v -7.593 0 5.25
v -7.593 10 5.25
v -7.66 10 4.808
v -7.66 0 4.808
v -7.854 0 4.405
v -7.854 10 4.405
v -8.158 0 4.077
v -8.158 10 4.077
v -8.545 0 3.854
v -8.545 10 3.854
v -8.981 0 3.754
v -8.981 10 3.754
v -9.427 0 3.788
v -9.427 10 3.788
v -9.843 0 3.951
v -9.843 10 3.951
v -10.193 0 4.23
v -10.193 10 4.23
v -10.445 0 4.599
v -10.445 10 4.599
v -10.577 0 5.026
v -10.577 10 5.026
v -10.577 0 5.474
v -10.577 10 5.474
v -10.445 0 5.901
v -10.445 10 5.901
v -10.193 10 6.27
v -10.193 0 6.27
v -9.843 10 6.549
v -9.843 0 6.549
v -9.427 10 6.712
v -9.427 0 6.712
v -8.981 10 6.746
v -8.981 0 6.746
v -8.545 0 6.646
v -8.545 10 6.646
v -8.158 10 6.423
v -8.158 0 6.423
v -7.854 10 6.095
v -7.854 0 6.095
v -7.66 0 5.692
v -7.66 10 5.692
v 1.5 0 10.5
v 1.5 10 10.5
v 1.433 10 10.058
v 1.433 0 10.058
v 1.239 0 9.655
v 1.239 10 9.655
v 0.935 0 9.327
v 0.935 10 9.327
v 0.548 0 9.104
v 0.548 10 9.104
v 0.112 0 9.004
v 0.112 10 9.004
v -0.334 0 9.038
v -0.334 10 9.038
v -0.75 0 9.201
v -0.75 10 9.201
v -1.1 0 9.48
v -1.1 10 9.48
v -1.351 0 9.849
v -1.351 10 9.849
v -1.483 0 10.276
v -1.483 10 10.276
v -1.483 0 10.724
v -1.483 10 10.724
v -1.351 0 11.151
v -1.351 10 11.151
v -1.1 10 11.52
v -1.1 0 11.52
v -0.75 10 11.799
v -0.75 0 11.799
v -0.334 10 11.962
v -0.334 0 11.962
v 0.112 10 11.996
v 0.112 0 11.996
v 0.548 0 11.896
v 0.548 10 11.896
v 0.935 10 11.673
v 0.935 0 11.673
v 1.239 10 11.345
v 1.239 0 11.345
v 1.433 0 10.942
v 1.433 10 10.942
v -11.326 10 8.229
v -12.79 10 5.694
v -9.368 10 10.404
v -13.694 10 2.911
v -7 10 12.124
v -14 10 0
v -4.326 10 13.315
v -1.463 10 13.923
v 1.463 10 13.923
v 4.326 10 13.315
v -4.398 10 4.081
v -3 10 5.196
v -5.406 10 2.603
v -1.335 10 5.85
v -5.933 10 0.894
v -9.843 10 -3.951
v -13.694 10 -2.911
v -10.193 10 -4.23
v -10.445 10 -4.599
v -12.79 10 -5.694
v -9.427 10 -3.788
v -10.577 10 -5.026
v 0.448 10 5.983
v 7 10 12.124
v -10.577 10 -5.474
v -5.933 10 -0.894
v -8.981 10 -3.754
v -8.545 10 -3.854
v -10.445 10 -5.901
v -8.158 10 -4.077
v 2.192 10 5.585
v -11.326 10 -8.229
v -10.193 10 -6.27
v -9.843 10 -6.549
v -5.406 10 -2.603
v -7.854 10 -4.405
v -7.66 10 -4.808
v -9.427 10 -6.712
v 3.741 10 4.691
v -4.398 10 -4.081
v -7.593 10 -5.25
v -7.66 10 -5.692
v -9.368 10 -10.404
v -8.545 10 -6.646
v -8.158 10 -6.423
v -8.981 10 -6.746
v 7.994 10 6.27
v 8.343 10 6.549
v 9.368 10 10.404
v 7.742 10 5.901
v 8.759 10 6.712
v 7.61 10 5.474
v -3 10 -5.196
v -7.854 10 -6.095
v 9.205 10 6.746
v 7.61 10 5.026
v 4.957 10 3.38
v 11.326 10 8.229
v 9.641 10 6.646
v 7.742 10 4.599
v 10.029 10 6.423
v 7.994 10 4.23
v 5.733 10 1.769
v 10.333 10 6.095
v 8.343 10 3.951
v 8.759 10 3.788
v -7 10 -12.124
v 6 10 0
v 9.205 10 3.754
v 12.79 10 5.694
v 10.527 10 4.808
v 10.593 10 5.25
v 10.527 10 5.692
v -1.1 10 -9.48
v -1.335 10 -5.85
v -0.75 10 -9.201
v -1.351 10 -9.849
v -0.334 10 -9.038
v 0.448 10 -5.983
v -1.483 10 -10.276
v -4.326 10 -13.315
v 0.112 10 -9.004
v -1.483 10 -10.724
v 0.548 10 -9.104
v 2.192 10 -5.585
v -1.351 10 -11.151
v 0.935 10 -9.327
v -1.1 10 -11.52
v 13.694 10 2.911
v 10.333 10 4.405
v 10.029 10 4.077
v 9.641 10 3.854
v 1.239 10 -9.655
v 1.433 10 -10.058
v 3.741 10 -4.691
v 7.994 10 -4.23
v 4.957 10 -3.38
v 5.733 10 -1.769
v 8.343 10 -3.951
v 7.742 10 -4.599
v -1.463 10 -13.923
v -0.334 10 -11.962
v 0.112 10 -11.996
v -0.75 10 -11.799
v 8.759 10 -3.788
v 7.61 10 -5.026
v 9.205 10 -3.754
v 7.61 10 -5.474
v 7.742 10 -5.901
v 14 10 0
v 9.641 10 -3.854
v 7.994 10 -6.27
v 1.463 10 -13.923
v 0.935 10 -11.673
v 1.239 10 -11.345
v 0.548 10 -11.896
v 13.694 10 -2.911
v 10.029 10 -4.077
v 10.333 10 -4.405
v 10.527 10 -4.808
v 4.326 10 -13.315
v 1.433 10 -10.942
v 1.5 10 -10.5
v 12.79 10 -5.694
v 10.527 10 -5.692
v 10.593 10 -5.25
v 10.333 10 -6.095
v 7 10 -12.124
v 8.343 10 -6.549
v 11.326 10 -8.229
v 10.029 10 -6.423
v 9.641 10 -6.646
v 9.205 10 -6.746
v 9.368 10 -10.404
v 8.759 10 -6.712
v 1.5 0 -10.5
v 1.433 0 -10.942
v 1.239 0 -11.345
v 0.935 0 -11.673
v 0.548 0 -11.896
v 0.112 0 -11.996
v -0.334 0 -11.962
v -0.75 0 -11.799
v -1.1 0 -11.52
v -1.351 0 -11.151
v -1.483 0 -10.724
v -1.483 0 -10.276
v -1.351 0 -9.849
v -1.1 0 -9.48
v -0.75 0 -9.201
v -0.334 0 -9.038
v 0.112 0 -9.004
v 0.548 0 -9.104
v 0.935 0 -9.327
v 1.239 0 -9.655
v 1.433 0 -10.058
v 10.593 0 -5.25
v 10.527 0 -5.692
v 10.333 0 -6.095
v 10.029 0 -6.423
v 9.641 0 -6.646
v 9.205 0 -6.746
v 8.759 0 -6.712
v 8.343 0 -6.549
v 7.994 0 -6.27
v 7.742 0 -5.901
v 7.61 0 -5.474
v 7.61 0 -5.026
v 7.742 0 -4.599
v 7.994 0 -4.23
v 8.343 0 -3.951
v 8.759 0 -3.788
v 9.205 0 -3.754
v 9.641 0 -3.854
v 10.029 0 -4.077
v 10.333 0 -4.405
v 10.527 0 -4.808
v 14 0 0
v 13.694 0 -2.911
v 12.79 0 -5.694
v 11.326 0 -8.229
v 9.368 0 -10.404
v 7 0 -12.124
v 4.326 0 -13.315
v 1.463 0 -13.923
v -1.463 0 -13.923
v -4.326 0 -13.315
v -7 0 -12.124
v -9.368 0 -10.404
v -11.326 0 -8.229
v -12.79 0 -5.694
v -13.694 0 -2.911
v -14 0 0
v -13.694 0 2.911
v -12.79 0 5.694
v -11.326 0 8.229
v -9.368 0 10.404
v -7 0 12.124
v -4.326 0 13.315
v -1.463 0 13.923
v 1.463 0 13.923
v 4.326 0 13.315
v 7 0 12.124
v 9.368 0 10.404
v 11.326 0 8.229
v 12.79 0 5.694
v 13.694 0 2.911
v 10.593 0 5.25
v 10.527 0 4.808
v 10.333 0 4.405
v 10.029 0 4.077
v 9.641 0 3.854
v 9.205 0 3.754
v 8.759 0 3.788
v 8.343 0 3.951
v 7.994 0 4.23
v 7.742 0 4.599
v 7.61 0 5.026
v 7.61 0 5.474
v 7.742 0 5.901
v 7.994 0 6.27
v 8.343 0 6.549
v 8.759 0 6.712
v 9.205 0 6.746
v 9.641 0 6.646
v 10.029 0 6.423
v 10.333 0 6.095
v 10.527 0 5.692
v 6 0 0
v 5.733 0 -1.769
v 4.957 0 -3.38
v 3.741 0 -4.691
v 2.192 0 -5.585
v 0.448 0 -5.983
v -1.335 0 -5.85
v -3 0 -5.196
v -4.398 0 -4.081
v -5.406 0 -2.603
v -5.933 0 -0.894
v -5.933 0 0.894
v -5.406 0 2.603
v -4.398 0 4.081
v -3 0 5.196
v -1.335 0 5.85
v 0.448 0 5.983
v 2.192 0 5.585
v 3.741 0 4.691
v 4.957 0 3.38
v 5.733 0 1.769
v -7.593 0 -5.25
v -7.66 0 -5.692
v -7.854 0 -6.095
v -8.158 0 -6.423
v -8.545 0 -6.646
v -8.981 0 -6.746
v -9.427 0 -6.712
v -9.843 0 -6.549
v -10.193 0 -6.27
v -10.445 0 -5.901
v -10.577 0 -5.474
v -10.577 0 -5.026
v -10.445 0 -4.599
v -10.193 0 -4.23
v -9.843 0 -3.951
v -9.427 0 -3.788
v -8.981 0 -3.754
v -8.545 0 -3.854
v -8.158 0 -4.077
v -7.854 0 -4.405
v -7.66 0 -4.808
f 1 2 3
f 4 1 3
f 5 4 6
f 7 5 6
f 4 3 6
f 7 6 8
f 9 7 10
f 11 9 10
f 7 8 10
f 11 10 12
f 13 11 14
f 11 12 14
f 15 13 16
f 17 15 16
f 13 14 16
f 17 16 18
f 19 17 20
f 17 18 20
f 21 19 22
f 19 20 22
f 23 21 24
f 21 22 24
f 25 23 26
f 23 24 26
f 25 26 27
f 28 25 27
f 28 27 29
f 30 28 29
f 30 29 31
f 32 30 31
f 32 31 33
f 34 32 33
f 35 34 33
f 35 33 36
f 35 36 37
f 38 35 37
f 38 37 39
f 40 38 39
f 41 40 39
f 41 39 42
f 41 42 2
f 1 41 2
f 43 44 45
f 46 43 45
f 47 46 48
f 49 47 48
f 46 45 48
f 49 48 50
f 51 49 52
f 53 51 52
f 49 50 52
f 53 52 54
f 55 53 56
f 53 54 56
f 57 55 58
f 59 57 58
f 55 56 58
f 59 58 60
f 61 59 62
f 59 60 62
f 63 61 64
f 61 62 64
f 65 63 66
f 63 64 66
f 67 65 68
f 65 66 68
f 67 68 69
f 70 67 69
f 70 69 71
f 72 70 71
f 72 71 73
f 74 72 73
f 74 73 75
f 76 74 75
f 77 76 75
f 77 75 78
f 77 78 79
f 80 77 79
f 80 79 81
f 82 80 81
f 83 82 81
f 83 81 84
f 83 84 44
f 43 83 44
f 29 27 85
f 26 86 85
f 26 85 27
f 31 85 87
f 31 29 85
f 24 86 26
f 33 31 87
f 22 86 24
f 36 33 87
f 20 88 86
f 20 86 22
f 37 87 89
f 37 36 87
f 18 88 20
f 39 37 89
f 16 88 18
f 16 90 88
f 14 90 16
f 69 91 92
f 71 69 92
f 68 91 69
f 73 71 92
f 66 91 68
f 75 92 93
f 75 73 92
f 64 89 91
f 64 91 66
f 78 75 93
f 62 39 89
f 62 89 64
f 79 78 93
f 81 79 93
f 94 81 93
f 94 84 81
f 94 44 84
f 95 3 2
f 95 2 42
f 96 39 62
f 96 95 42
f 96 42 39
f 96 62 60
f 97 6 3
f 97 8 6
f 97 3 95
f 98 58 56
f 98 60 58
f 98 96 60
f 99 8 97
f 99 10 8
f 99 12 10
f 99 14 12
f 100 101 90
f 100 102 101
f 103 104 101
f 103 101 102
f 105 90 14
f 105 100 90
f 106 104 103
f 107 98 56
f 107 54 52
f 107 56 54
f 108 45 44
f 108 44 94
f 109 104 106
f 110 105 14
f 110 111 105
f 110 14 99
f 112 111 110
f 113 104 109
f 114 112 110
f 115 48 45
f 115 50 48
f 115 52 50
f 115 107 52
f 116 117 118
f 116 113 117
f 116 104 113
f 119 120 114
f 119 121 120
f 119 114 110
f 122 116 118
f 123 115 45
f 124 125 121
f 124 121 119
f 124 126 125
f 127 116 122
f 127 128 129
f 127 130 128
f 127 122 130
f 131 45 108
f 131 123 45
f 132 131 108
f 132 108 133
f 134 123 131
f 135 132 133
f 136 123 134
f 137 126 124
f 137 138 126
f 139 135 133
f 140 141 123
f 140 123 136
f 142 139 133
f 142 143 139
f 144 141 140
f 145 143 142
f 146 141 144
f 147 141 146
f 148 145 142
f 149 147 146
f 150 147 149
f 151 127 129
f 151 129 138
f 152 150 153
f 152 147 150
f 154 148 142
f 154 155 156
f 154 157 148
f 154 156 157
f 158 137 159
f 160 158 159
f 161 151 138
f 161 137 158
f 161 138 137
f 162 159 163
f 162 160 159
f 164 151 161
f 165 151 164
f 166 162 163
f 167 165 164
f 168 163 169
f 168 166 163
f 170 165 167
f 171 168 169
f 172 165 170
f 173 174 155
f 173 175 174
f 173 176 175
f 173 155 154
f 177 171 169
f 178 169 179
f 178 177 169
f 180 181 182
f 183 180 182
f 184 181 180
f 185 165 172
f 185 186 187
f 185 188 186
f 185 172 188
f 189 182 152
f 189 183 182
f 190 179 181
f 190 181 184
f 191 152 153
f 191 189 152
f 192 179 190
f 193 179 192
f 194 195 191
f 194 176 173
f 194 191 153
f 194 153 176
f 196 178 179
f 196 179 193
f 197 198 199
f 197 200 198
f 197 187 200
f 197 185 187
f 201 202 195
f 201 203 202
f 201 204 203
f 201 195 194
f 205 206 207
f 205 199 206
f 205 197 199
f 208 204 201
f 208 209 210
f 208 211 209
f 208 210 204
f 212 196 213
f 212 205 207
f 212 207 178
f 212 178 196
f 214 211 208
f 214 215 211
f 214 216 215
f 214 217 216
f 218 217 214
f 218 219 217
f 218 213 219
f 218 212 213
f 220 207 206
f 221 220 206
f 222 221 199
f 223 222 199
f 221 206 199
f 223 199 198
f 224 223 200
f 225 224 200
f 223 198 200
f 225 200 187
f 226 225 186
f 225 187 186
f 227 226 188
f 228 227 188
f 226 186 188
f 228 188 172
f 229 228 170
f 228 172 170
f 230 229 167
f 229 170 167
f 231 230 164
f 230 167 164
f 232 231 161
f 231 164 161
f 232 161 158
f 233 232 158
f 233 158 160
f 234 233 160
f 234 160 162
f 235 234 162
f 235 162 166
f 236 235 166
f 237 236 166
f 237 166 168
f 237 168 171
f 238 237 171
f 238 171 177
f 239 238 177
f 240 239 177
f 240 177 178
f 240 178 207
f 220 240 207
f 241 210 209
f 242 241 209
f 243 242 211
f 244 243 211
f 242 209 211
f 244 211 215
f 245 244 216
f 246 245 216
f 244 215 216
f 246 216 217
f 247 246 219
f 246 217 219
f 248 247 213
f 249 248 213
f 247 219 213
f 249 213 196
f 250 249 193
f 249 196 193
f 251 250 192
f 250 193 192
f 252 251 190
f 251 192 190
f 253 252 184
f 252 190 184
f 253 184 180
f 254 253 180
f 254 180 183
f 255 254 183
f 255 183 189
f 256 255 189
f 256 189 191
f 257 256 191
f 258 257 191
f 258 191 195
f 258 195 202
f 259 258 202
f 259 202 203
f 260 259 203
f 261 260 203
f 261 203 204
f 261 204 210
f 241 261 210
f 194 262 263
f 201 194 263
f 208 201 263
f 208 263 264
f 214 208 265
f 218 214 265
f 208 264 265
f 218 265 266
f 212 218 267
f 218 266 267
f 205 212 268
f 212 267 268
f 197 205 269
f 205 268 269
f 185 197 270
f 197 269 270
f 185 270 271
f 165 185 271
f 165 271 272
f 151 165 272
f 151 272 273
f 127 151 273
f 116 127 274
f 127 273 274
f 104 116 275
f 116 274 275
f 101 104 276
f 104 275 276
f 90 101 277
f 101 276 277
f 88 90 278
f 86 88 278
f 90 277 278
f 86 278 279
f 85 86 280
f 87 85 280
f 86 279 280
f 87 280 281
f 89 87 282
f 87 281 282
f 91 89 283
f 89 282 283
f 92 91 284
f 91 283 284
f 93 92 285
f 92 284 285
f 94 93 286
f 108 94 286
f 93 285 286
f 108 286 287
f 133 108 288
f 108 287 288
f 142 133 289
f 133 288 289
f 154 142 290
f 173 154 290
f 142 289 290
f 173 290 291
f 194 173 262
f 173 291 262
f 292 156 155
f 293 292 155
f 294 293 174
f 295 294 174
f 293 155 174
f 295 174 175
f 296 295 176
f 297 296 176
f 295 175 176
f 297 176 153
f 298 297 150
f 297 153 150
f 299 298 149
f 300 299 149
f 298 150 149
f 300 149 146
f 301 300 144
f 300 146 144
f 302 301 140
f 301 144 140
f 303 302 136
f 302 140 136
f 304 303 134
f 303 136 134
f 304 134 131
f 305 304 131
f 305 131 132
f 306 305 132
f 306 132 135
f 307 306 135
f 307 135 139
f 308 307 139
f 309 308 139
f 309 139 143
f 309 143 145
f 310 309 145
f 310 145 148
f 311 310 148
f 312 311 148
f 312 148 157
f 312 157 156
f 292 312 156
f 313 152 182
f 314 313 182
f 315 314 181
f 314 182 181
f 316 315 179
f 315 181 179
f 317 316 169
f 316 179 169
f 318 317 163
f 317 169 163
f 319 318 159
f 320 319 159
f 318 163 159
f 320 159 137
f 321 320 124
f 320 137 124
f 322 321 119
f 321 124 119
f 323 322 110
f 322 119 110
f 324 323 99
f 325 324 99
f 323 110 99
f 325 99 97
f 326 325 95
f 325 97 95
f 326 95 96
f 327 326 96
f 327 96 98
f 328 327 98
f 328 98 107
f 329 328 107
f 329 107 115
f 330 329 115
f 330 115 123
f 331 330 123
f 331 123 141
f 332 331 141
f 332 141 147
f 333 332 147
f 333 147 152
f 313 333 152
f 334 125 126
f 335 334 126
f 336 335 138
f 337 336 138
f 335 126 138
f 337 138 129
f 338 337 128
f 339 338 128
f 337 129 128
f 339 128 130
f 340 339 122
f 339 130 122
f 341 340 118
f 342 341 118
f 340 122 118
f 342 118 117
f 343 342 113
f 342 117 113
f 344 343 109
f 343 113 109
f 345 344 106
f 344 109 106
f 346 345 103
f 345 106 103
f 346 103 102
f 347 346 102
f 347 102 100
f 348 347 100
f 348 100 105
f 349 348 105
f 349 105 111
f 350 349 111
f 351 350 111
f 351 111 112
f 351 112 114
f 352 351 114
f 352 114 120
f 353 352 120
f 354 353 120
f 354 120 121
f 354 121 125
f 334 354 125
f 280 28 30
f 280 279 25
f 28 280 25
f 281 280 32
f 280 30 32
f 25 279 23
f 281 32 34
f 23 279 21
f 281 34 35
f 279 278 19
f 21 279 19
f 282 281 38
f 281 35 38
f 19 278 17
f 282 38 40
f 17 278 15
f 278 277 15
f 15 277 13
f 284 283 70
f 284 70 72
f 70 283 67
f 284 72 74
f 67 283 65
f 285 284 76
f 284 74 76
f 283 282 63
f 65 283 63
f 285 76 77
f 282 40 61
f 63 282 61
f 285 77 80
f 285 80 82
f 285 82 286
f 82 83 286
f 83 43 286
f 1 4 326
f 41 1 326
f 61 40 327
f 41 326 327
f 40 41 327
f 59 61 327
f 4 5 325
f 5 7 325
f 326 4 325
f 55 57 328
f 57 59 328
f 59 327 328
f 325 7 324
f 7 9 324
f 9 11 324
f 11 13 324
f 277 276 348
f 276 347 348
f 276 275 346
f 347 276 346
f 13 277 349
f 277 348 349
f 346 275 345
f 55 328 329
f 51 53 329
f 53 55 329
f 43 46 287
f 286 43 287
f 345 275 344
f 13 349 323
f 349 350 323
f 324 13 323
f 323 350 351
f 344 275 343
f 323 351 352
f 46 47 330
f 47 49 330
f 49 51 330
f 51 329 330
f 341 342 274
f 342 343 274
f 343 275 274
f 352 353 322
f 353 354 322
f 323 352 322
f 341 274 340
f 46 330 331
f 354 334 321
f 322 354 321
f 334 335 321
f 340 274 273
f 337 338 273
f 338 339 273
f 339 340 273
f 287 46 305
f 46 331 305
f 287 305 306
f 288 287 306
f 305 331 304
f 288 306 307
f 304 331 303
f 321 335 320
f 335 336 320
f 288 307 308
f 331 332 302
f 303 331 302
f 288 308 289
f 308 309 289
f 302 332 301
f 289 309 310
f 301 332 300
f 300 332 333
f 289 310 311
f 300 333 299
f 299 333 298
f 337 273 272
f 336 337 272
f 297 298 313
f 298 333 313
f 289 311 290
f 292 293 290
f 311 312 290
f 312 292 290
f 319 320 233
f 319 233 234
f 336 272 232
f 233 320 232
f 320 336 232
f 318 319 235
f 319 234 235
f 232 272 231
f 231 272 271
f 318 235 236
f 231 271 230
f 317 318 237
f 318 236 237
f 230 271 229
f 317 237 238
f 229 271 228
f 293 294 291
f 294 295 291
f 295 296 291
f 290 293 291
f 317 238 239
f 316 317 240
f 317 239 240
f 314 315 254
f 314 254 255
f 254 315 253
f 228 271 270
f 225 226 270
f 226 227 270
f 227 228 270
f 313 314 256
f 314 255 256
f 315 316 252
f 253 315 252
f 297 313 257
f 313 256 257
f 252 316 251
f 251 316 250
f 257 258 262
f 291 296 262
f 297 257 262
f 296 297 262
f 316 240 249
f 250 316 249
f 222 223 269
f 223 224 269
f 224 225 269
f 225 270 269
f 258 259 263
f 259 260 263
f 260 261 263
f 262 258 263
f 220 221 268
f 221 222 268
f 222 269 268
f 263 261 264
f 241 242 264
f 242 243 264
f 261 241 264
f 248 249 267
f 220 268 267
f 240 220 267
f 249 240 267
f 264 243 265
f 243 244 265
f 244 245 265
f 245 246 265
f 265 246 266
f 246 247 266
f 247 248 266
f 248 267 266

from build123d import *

# Parameters (mm, degrees)
SKETCH1_R           = 14
BOSS_EXTRUDE1_DEPTH = 10
SKETCH2_R           = 1.5
SKETCH2_R_2         = 6
CUT_EXTRUDE1_DEPTH  = 11


with BuildPart() as part:
    # Sketch1 → Boss-Extrude1 (new body)
    with BuildSketch(Plane(origin=(0, 0, 0), x_dir=(1, 0, 0), z_dir=(0, 1, 0))):
        Circle(SKETCH1_R)
    extrude(amount=BOSS_EXTRUDE1_DEPTH)

    # Sketch2 → Cut-Extrude1 (cut, through all)
    with BuildSketch(Plane(origin=(0, 10, 0), x_dir=(1, 0, 0), z_dir=(0, 1, 0))):
        with Locations((0, 10.5)):
            Circle(SKETCH2_R)
        Circle(SKETCH2_R_2)
        with Locations((9.09326674, 5.25)):
            Circle(SKETCH2_R)
        with Locations((9.09326674, -5.25)):
            Circle(SKETCH2_R)
        with Locations((0, -10.5)):
            Circle(SKETCH2_R)
        with Locations((-9.09326674, -5.25)):
            Circle(SKETCH2_R)
        with Locations((-9.09326674, 5.25)):
            Circle(SKETCH2_R)
    extrude(amount=-CUT_EXTRUDE1_DEPTH, mode=Mode.SUBTRACT)


solid = part.part
